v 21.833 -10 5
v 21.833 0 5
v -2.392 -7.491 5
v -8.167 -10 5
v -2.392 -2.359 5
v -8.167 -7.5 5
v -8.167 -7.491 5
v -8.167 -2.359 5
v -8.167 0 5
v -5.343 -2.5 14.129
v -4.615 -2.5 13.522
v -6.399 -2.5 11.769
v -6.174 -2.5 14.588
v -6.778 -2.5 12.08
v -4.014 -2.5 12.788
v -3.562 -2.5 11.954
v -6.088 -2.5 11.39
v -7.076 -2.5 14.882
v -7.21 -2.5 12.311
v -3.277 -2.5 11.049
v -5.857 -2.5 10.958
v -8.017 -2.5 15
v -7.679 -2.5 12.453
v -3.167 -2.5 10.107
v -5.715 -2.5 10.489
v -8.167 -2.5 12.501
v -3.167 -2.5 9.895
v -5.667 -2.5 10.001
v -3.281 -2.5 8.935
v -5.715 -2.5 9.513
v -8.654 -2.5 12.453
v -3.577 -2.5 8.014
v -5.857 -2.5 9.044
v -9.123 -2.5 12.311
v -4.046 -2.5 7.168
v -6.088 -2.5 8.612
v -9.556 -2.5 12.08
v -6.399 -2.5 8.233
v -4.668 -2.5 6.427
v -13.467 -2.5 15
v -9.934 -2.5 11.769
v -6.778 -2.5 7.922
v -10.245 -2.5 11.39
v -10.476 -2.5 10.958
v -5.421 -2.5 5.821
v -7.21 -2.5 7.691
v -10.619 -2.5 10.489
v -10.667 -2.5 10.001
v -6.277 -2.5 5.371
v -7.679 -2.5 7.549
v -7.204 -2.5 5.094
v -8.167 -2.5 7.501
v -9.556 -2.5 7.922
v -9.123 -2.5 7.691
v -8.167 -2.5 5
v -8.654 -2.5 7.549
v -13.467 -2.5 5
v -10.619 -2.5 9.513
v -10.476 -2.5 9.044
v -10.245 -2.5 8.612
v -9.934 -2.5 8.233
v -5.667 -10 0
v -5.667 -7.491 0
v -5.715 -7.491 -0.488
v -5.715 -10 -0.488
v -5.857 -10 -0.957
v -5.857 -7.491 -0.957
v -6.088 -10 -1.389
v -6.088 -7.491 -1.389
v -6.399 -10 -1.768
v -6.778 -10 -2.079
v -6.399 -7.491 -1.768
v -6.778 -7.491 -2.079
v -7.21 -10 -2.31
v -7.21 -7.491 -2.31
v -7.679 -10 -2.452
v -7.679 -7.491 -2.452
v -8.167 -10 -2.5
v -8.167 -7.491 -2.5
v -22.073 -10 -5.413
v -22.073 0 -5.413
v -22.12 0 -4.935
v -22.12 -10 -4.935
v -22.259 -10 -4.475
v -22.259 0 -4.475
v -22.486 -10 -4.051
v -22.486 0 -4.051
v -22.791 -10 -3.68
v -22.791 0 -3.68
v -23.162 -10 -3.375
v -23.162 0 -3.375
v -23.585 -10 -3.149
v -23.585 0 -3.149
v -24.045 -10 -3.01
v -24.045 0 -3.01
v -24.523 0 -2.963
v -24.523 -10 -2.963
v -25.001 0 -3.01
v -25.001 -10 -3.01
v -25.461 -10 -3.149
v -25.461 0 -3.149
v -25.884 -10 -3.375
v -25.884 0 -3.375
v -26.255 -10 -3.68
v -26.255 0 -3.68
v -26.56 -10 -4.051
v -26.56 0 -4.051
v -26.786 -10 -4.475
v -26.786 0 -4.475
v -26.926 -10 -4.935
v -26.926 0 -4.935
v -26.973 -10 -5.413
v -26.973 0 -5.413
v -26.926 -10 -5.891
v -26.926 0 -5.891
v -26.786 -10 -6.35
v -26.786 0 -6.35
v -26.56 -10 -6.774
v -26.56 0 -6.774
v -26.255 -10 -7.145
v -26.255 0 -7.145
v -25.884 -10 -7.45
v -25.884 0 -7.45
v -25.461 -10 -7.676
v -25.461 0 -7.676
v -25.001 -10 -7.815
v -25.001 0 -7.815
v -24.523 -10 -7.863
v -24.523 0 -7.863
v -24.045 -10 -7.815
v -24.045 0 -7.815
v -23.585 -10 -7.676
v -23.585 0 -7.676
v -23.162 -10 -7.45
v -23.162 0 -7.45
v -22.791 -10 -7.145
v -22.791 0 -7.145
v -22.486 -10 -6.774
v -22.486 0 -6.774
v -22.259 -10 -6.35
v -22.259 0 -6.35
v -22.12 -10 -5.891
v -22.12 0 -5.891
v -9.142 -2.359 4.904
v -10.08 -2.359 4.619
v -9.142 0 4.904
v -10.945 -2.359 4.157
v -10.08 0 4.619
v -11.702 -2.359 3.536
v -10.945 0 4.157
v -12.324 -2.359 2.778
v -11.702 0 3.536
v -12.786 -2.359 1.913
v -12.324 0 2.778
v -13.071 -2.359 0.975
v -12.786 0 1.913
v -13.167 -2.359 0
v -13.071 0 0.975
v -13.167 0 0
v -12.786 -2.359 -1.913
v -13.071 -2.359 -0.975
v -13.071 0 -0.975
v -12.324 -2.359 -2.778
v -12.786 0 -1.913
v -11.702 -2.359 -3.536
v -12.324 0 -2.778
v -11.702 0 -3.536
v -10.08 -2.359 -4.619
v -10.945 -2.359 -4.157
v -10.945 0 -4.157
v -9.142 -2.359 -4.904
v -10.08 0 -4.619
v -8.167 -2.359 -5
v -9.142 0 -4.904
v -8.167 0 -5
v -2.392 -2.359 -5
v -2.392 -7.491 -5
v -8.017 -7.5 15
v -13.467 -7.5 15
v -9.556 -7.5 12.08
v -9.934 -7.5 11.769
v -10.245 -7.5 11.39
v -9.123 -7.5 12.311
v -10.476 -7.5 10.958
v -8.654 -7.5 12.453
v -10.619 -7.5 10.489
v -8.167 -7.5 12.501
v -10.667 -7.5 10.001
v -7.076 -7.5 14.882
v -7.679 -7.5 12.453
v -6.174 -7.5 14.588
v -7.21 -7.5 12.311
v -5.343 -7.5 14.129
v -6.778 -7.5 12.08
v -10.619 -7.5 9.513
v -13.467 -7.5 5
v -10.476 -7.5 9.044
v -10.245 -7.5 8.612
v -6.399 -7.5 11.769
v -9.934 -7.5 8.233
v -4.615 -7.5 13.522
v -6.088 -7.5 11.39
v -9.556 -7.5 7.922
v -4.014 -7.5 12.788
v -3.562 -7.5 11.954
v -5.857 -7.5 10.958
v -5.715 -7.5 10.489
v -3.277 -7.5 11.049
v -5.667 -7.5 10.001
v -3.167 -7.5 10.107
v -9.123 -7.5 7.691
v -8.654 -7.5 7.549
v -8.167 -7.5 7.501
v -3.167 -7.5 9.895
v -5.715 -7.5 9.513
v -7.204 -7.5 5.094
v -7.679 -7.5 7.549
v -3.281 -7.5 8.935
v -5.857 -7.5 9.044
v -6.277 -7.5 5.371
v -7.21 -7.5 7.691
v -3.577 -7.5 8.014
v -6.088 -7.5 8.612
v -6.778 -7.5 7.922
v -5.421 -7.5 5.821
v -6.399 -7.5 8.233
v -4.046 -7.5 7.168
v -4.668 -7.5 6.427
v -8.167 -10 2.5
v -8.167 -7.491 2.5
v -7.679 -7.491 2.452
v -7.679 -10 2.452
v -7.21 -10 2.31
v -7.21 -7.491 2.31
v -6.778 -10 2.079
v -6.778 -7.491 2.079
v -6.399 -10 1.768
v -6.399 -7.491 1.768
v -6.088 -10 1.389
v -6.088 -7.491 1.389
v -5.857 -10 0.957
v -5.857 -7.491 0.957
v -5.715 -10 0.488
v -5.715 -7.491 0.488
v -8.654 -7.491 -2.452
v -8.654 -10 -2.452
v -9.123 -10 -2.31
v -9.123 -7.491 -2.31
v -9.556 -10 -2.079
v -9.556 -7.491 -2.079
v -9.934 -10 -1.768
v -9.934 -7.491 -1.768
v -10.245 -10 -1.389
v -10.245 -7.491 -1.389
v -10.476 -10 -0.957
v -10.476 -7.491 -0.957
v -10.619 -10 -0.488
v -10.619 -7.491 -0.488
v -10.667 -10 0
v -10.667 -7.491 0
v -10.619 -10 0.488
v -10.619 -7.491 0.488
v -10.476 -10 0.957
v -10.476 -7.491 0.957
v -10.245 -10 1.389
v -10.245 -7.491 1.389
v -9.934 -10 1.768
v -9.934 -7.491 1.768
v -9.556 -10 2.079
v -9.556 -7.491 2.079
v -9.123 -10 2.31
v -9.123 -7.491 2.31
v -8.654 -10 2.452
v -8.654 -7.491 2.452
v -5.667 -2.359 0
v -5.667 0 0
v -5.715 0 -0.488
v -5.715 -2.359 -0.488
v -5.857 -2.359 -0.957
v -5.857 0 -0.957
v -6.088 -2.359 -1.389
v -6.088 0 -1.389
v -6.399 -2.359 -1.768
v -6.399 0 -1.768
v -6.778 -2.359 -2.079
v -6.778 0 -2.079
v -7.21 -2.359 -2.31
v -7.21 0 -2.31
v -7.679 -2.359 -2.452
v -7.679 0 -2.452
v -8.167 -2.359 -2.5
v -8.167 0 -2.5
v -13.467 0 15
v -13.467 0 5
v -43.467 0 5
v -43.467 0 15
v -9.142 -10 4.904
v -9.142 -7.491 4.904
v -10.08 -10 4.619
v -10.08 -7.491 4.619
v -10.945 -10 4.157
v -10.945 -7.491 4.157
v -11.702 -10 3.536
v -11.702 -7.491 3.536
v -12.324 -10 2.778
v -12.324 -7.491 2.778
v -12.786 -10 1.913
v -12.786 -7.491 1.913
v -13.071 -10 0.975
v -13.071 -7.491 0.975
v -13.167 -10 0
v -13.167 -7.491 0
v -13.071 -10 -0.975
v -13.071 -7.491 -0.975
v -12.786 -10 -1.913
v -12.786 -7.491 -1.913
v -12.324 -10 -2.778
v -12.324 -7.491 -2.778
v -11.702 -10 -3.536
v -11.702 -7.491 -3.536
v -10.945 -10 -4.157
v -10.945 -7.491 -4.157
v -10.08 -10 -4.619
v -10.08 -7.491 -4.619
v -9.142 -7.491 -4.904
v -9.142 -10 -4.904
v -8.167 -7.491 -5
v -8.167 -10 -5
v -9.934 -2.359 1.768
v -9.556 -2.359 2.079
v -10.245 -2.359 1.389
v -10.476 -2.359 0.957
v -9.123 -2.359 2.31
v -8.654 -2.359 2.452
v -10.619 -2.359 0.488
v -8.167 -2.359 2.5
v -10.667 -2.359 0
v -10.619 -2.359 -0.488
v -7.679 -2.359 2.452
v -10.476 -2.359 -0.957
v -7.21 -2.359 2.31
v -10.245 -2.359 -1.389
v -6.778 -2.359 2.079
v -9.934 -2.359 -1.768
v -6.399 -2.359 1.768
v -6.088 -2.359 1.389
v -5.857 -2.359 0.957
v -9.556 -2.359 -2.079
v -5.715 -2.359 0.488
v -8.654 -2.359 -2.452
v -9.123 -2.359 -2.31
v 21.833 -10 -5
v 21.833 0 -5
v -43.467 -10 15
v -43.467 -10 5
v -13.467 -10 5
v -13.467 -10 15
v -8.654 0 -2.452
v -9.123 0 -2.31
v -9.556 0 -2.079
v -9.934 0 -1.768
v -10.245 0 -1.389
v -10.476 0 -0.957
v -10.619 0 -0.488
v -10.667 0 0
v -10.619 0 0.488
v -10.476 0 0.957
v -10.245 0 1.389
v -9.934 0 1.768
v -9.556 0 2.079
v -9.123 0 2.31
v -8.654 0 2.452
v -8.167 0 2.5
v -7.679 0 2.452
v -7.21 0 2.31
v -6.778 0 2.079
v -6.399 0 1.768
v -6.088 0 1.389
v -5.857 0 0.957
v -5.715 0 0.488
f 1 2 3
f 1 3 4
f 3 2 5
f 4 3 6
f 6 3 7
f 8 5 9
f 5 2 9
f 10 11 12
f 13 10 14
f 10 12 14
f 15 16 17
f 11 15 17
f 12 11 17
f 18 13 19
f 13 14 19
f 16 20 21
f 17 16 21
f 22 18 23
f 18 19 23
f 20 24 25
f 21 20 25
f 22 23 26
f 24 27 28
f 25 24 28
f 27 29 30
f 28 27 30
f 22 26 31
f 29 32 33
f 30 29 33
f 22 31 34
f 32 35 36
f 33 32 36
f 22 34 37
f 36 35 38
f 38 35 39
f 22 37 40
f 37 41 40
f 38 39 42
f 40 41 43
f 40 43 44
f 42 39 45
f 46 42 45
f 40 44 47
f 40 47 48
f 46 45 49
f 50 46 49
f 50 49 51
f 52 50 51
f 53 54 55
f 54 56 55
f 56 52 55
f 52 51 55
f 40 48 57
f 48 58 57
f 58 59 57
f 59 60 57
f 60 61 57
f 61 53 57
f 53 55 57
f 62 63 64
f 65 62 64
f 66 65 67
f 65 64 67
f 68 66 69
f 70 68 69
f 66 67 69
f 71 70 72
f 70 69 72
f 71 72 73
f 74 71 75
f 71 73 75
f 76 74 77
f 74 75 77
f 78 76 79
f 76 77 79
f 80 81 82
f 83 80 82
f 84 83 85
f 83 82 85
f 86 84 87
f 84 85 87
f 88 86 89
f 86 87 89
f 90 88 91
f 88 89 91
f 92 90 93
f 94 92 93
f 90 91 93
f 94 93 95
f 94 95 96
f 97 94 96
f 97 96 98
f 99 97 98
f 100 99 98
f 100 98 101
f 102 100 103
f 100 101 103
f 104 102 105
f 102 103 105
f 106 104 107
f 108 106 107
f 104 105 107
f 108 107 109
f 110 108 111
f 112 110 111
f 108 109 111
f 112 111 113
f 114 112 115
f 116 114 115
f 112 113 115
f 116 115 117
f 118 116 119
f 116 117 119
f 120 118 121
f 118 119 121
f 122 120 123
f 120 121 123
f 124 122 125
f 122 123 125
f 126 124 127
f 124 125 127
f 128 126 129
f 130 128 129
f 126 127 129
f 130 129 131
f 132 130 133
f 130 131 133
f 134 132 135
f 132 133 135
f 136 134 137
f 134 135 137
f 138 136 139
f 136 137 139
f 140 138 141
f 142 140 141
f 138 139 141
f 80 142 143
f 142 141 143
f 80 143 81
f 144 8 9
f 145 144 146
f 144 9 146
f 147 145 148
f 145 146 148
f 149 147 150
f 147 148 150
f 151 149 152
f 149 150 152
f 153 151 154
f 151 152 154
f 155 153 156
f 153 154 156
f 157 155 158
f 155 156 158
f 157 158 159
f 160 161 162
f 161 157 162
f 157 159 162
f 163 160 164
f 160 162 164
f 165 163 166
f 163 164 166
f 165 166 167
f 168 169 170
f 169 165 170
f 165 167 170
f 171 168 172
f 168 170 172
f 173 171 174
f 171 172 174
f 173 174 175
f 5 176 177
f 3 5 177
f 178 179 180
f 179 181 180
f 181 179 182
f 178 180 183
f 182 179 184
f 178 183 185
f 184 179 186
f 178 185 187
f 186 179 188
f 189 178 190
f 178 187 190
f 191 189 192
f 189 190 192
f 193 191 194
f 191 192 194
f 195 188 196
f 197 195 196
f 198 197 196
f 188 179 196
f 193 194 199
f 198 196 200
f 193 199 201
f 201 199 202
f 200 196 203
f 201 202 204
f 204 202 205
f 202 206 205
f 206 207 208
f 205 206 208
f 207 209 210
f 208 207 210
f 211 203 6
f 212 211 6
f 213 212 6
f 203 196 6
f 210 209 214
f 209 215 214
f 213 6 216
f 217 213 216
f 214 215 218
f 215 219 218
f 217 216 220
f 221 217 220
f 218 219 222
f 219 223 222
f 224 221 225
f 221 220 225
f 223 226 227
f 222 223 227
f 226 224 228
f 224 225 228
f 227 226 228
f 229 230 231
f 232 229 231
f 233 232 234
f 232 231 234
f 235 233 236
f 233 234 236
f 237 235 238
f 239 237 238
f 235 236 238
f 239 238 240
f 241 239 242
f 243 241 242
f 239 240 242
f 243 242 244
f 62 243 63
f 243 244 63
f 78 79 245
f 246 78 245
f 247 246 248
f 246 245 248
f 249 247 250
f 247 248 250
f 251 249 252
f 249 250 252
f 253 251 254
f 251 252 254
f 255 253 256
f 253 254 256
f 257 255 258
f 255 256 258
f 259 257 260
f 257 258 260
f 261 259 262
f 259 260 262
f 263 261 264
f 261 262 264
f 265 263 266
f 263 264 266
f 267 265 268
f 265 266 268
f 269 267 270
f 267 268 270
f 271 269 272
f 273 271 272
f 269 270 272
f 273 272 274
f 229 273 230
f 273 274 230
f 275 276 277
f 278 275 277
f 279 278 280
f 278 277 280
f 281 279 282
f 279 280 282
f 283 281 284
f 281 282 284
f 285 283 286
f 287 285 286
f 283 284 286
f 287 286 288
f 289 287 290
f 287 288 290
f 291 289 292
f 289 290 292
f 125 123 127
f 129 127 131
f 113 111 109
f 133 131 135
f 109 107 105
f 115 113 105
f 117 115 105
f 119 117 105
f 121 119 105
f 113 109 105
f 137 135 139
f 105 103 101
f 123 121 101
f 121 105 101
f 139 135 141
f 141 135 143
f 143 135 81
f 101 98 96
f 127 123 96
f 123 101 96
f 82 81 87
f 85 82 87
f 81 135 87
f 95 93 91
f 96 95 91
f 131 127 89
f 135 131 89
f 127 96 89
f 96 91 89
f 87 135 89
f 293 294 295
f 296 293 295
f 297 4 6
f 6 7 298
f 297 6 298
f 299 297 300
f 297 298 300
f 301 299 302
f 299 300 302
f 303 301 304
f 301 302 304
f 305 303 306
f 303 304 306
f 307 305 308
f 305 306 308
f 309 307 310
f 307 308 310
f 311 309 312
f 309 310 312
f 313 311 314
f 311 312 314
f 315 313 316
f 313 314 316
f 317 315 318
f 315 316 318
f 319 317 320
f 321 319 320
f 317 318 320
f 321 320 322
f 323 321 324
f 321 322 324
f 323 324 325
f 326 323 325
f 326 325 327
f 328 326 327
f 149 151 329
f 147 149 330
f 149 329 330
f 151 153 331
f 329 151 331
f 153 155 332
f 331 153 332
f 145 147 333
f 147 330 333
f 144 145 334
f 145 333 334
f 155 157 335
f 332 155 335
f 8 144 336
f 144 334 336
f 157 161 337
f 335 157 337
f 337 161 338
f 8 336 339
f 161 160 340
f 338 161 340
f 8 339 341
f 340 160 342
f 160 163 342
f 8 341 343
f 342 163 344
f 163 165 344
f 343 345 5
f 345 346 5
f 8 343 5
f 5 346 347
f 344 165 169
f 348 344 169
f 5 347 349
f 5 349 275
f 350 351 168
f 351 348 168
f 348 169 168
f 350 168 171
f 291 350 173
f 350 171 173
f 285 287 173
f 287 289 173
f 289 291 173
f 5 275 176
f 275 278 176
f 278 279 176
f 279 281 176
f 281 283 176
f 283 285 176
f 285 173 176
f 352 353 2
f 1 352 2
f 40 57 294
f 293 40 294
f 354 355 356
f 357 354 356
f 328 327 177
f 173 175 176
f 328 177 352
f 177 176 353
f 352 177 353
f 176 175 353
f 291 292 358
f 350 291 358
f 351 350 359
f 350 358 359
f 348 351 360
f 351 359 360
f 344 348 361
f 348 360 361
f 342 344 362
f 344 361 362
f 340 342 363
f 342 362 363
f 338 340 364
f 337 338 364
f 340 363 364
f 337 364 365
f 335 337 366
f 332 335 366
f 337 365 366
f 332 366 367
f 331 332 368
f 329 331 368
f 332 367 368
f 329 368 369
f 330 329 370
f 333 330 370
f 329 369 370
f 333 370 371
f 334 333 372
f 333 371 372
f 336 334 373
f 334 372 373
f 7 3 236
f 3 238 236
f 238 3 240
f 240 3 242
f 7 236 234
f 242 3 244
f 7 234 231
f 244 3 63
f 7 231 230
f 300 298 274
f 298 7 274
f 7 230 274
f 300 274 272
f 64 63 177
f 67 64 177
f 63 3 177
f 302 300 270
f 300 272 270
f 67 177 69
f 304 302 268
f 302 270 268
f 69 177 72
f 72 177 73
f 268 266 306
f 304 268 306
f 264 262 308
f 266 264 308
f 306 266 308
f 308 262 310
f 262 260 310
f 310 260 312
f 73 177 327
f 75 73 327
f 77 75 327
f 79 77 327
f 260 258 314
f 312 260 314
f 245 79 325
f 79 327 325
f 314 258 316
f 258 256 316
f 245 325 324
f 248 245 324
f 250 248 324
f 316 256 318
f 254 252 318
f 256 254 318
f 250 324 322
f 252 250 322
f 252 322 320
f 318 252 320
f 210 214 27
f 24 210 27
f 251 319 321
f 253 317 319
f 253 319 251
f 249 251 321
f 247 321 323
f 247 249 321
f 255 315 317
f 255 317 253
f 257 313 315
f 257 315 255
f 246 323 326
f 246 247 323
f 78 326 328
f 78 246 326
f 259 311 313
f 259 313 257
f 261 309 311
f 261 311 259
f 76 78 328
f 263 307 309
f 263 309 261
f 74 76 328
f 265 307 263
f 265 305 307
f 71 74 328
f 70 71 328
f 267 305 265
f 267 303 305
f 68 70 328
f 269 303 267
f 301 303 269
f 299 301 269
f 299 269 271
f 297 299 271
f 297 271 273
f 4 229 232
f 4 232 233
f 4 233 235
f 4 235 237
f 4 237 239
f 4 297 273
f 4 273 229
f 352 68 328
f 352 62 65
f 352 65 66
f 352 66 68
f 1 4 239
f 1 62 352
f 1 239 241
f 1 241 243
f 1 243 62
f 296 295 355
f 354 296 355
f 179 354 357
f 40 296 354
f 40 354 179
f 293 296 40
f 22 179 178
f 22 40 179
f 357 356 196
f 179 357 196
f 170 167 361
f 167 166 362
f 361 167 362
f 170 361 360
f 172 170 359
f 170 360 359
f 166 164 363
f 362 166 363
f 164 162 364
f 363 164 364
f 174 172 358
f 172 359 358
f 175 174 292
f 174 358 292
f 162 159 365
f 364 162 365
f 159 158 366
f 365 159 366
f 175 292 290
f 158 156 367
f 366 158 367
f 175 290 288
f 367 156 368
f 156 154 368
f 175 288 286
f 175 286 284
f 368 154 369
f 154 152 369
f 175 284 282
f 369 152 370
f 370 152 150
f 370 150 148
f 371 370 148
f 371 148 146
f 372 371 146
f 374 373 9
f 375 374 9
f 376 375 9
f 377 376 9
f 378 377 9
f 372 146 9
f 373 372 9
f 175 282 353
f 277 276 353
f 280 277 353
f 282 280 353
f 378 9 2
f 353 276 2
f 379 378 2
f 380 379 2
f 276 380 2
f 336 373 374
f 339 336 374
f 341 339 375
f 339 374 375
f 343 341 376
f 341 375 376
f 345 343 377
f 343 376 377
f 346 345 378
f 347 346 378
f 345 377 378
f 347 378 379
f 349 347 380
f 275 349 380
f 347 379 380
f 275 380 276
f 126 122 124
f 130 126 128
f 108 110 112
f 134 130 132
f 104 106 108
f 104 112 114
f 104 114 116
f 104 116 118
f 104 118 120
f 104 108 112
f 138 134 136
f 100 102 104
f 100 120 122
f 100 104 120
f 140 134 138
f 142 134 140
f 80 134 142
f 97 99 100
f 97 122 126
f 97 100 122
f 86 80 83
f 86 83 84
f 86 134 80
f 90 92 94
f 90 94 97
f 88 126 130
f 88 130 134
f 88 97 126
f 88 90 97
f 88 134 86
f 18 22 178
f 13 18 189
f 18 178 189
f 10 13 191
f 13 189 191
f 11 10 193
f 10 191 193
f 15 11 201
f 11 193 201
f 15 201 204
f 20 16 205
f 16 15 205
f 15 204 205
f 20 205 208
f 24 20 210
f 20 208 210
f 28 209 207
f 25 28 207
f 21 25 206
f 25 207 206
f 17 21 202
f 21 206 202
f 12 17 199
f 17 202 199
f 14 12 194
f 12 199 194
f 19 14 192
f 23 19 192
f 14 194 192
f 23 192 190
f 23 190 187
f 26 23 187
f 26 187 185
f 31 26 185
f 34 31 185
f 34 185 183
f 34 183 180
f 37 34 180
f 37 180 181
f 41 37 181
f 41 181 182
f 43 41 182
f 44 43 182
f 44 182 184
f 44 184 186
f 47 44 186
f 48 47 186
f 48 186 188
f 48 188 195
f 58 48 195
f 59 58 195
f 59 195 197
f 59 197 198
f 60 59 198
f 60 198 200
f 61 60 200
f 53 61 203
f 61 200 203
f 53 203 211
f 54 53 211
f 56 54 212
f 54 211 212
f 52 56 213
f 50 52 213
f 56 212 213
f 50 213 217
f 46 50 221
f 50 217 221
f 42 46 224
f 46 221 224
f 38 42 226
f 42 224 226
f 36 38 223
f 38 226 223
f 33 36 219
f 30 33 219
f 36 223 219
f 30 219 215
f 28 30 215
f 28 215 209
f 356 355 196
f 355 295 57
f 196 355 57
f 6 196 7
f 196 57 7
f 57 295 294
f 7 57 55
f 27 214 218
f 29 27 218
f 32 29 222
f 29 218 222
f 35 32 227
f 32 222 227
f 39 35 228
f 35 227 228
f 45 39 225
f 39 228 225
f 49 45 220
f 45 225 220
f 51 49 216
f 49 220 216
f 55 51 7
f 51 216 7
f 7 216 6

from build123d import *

# Parameters (mm, degrees)
F1_DEPTH  = 10
F3_DEPTH  = 10
F5_DEPTH  = 10
F4_R      = 2.5
F6_DEPTH  = 25
F7_R      = 2.45
F8_DEPTH  = 10
F10_DEPTH = 10


with BuildPart() as f1:
    # F0 (on Front) → F1 (new body)
    with BuildSketch(Plane.XZ):
        with BuildLine():
            ThreePointArc((-8.1666665228, -5), (-3.1666665228, 0), (-8.1666665228, 5))
            Line((-8.1666665228, 5), (-8.1666665228, 2.5))
            ThreePointArc((-8.1666665228, 2.5), (-6.3988995699, 1.767766953), (-5.6666665228, 0))
            ThreePointArc((-5.6666665228, 0), (-6.3988995699, -1.767766953), (-8.1666665228, -2.5))
            Line((-8.1666665228, -2.5), (-8.1666665228, -5))
        make_face()
        with BuildLine():
            Line((21.8333334772, 5), (-8.1666665228, 5))
            ThreePointArc((-8.1666665228, 5), (-3.1666665228, 0), (-8.1666665228, -5))
            Line((-8.1666665228, -5), (21.8333334772, -5))
            Line((21.8333334772, -5), (21.8333334772, 5))
        make_face()
        with BuildLine():
            Line((-8.1666665228, 2.5), (-8.1666665228, 5))
            ThreePointArc((-8.1666665228, 5), (-13.1666665228, 0), (-8.1666665228, -5))
            Line((-8.1666665228, -5), (-8.1666665228, -2.5))
            ThreePointArc((-8.1666665228, -2.5), (-10.6666665228, 0), (-8.1666665228, 2.5))
        make_face()
    extrude(amount=F1_DEPTH)

    # F2 (on face) → F3 (join)
    with BuildSketch(Plane.XY.offset(5)):
        Polygon((-13.4666665228, -2.5), (-13.4666665228, 0), (-43.4666665228, 0), (-43.4666665228, -10), (-13.4666665228, -10), (-13.4666665228, -7.5), (-3.1666665228, -7.5), (-3.1666665228, -2.5), align=None)
    extrude(amount=F3_DEPTH)

    # F4 (on face) → F5 (cut)
    with BuildSketch(Plane.XZ.offset(7.5)):
        with BuildLine():
            ThreePointArc((-3.1666665228, 9.8950530168), (-4.6680402197, 6.4274902598), (-8.1666665228, 5))
            Line((-8.1666665228, 5), (-3.1666665228, 5))
            Line((-3.1666665228, 5), (-3.1666665228, 9.8950530168))
        make_face()
        with BuildLine():
            ThreePointArc((-8.0166665228, 15), (-4.6148352571, 13.5218842825), (-3.1666665228, 10.1071969832))
            Line((-3.1666665228, 10.1071969832), (-3.1666665228, 15))
            Line((-3.1666665228, 15), (-8.0166665228, 15))
        make_face()
    extrude(amount=-F5_DEPTH, mode=Mode.SUBTRACT)

    # F4 (on face) → F6 (cut)
    with BuildSketch(Plane.XZ.offset(7.5)):
        with Locations((-8.1666665228, 10.001125)):
            Circle(F4_R)
    extrude(amount=-F6_DEPTH, mode=Mode.SUBTRACT)

    # F9 (on face) → F10 (cut)
    with BuildSketch(Plane(origin=(0, 0, -5), x_dir=(1, 0, 0), z_dir=(0, 0, -1))):
        Polygon((-13.4138111025, 10.8968433209), (-2.3915369313, 10.8968433209), (-2.3915369313, 14.1670521219), (-16.214871059, 14.1670521219), (-16.214871059, -4.0230309721), (-2.3915369313, -4.0230309721), (-2.3915369313, -2.4774149803), (-13.4138111025, -2.4774149803), (-13.4138111025, 2.3589546254), (-2.3915369313, 2.3589546254), (-2.3915369313, 7.4913585559), (-13.4138111025, 7.4913585559), align=None)
    extrude(amount=-F10_DEPTH, mode=Mode.SUBTRACT)


with BuildPart() as f8:
    # F7 (on Front) → F8 (new body)
    with BuildSketch(Plane.XZ):
        with Locations((-24.5229806751, -5.4125646129)):
            Circle(F7_R)
    extrude(amount=F8_DEPTH)


solid = Compound([f1.part, f8.part])
